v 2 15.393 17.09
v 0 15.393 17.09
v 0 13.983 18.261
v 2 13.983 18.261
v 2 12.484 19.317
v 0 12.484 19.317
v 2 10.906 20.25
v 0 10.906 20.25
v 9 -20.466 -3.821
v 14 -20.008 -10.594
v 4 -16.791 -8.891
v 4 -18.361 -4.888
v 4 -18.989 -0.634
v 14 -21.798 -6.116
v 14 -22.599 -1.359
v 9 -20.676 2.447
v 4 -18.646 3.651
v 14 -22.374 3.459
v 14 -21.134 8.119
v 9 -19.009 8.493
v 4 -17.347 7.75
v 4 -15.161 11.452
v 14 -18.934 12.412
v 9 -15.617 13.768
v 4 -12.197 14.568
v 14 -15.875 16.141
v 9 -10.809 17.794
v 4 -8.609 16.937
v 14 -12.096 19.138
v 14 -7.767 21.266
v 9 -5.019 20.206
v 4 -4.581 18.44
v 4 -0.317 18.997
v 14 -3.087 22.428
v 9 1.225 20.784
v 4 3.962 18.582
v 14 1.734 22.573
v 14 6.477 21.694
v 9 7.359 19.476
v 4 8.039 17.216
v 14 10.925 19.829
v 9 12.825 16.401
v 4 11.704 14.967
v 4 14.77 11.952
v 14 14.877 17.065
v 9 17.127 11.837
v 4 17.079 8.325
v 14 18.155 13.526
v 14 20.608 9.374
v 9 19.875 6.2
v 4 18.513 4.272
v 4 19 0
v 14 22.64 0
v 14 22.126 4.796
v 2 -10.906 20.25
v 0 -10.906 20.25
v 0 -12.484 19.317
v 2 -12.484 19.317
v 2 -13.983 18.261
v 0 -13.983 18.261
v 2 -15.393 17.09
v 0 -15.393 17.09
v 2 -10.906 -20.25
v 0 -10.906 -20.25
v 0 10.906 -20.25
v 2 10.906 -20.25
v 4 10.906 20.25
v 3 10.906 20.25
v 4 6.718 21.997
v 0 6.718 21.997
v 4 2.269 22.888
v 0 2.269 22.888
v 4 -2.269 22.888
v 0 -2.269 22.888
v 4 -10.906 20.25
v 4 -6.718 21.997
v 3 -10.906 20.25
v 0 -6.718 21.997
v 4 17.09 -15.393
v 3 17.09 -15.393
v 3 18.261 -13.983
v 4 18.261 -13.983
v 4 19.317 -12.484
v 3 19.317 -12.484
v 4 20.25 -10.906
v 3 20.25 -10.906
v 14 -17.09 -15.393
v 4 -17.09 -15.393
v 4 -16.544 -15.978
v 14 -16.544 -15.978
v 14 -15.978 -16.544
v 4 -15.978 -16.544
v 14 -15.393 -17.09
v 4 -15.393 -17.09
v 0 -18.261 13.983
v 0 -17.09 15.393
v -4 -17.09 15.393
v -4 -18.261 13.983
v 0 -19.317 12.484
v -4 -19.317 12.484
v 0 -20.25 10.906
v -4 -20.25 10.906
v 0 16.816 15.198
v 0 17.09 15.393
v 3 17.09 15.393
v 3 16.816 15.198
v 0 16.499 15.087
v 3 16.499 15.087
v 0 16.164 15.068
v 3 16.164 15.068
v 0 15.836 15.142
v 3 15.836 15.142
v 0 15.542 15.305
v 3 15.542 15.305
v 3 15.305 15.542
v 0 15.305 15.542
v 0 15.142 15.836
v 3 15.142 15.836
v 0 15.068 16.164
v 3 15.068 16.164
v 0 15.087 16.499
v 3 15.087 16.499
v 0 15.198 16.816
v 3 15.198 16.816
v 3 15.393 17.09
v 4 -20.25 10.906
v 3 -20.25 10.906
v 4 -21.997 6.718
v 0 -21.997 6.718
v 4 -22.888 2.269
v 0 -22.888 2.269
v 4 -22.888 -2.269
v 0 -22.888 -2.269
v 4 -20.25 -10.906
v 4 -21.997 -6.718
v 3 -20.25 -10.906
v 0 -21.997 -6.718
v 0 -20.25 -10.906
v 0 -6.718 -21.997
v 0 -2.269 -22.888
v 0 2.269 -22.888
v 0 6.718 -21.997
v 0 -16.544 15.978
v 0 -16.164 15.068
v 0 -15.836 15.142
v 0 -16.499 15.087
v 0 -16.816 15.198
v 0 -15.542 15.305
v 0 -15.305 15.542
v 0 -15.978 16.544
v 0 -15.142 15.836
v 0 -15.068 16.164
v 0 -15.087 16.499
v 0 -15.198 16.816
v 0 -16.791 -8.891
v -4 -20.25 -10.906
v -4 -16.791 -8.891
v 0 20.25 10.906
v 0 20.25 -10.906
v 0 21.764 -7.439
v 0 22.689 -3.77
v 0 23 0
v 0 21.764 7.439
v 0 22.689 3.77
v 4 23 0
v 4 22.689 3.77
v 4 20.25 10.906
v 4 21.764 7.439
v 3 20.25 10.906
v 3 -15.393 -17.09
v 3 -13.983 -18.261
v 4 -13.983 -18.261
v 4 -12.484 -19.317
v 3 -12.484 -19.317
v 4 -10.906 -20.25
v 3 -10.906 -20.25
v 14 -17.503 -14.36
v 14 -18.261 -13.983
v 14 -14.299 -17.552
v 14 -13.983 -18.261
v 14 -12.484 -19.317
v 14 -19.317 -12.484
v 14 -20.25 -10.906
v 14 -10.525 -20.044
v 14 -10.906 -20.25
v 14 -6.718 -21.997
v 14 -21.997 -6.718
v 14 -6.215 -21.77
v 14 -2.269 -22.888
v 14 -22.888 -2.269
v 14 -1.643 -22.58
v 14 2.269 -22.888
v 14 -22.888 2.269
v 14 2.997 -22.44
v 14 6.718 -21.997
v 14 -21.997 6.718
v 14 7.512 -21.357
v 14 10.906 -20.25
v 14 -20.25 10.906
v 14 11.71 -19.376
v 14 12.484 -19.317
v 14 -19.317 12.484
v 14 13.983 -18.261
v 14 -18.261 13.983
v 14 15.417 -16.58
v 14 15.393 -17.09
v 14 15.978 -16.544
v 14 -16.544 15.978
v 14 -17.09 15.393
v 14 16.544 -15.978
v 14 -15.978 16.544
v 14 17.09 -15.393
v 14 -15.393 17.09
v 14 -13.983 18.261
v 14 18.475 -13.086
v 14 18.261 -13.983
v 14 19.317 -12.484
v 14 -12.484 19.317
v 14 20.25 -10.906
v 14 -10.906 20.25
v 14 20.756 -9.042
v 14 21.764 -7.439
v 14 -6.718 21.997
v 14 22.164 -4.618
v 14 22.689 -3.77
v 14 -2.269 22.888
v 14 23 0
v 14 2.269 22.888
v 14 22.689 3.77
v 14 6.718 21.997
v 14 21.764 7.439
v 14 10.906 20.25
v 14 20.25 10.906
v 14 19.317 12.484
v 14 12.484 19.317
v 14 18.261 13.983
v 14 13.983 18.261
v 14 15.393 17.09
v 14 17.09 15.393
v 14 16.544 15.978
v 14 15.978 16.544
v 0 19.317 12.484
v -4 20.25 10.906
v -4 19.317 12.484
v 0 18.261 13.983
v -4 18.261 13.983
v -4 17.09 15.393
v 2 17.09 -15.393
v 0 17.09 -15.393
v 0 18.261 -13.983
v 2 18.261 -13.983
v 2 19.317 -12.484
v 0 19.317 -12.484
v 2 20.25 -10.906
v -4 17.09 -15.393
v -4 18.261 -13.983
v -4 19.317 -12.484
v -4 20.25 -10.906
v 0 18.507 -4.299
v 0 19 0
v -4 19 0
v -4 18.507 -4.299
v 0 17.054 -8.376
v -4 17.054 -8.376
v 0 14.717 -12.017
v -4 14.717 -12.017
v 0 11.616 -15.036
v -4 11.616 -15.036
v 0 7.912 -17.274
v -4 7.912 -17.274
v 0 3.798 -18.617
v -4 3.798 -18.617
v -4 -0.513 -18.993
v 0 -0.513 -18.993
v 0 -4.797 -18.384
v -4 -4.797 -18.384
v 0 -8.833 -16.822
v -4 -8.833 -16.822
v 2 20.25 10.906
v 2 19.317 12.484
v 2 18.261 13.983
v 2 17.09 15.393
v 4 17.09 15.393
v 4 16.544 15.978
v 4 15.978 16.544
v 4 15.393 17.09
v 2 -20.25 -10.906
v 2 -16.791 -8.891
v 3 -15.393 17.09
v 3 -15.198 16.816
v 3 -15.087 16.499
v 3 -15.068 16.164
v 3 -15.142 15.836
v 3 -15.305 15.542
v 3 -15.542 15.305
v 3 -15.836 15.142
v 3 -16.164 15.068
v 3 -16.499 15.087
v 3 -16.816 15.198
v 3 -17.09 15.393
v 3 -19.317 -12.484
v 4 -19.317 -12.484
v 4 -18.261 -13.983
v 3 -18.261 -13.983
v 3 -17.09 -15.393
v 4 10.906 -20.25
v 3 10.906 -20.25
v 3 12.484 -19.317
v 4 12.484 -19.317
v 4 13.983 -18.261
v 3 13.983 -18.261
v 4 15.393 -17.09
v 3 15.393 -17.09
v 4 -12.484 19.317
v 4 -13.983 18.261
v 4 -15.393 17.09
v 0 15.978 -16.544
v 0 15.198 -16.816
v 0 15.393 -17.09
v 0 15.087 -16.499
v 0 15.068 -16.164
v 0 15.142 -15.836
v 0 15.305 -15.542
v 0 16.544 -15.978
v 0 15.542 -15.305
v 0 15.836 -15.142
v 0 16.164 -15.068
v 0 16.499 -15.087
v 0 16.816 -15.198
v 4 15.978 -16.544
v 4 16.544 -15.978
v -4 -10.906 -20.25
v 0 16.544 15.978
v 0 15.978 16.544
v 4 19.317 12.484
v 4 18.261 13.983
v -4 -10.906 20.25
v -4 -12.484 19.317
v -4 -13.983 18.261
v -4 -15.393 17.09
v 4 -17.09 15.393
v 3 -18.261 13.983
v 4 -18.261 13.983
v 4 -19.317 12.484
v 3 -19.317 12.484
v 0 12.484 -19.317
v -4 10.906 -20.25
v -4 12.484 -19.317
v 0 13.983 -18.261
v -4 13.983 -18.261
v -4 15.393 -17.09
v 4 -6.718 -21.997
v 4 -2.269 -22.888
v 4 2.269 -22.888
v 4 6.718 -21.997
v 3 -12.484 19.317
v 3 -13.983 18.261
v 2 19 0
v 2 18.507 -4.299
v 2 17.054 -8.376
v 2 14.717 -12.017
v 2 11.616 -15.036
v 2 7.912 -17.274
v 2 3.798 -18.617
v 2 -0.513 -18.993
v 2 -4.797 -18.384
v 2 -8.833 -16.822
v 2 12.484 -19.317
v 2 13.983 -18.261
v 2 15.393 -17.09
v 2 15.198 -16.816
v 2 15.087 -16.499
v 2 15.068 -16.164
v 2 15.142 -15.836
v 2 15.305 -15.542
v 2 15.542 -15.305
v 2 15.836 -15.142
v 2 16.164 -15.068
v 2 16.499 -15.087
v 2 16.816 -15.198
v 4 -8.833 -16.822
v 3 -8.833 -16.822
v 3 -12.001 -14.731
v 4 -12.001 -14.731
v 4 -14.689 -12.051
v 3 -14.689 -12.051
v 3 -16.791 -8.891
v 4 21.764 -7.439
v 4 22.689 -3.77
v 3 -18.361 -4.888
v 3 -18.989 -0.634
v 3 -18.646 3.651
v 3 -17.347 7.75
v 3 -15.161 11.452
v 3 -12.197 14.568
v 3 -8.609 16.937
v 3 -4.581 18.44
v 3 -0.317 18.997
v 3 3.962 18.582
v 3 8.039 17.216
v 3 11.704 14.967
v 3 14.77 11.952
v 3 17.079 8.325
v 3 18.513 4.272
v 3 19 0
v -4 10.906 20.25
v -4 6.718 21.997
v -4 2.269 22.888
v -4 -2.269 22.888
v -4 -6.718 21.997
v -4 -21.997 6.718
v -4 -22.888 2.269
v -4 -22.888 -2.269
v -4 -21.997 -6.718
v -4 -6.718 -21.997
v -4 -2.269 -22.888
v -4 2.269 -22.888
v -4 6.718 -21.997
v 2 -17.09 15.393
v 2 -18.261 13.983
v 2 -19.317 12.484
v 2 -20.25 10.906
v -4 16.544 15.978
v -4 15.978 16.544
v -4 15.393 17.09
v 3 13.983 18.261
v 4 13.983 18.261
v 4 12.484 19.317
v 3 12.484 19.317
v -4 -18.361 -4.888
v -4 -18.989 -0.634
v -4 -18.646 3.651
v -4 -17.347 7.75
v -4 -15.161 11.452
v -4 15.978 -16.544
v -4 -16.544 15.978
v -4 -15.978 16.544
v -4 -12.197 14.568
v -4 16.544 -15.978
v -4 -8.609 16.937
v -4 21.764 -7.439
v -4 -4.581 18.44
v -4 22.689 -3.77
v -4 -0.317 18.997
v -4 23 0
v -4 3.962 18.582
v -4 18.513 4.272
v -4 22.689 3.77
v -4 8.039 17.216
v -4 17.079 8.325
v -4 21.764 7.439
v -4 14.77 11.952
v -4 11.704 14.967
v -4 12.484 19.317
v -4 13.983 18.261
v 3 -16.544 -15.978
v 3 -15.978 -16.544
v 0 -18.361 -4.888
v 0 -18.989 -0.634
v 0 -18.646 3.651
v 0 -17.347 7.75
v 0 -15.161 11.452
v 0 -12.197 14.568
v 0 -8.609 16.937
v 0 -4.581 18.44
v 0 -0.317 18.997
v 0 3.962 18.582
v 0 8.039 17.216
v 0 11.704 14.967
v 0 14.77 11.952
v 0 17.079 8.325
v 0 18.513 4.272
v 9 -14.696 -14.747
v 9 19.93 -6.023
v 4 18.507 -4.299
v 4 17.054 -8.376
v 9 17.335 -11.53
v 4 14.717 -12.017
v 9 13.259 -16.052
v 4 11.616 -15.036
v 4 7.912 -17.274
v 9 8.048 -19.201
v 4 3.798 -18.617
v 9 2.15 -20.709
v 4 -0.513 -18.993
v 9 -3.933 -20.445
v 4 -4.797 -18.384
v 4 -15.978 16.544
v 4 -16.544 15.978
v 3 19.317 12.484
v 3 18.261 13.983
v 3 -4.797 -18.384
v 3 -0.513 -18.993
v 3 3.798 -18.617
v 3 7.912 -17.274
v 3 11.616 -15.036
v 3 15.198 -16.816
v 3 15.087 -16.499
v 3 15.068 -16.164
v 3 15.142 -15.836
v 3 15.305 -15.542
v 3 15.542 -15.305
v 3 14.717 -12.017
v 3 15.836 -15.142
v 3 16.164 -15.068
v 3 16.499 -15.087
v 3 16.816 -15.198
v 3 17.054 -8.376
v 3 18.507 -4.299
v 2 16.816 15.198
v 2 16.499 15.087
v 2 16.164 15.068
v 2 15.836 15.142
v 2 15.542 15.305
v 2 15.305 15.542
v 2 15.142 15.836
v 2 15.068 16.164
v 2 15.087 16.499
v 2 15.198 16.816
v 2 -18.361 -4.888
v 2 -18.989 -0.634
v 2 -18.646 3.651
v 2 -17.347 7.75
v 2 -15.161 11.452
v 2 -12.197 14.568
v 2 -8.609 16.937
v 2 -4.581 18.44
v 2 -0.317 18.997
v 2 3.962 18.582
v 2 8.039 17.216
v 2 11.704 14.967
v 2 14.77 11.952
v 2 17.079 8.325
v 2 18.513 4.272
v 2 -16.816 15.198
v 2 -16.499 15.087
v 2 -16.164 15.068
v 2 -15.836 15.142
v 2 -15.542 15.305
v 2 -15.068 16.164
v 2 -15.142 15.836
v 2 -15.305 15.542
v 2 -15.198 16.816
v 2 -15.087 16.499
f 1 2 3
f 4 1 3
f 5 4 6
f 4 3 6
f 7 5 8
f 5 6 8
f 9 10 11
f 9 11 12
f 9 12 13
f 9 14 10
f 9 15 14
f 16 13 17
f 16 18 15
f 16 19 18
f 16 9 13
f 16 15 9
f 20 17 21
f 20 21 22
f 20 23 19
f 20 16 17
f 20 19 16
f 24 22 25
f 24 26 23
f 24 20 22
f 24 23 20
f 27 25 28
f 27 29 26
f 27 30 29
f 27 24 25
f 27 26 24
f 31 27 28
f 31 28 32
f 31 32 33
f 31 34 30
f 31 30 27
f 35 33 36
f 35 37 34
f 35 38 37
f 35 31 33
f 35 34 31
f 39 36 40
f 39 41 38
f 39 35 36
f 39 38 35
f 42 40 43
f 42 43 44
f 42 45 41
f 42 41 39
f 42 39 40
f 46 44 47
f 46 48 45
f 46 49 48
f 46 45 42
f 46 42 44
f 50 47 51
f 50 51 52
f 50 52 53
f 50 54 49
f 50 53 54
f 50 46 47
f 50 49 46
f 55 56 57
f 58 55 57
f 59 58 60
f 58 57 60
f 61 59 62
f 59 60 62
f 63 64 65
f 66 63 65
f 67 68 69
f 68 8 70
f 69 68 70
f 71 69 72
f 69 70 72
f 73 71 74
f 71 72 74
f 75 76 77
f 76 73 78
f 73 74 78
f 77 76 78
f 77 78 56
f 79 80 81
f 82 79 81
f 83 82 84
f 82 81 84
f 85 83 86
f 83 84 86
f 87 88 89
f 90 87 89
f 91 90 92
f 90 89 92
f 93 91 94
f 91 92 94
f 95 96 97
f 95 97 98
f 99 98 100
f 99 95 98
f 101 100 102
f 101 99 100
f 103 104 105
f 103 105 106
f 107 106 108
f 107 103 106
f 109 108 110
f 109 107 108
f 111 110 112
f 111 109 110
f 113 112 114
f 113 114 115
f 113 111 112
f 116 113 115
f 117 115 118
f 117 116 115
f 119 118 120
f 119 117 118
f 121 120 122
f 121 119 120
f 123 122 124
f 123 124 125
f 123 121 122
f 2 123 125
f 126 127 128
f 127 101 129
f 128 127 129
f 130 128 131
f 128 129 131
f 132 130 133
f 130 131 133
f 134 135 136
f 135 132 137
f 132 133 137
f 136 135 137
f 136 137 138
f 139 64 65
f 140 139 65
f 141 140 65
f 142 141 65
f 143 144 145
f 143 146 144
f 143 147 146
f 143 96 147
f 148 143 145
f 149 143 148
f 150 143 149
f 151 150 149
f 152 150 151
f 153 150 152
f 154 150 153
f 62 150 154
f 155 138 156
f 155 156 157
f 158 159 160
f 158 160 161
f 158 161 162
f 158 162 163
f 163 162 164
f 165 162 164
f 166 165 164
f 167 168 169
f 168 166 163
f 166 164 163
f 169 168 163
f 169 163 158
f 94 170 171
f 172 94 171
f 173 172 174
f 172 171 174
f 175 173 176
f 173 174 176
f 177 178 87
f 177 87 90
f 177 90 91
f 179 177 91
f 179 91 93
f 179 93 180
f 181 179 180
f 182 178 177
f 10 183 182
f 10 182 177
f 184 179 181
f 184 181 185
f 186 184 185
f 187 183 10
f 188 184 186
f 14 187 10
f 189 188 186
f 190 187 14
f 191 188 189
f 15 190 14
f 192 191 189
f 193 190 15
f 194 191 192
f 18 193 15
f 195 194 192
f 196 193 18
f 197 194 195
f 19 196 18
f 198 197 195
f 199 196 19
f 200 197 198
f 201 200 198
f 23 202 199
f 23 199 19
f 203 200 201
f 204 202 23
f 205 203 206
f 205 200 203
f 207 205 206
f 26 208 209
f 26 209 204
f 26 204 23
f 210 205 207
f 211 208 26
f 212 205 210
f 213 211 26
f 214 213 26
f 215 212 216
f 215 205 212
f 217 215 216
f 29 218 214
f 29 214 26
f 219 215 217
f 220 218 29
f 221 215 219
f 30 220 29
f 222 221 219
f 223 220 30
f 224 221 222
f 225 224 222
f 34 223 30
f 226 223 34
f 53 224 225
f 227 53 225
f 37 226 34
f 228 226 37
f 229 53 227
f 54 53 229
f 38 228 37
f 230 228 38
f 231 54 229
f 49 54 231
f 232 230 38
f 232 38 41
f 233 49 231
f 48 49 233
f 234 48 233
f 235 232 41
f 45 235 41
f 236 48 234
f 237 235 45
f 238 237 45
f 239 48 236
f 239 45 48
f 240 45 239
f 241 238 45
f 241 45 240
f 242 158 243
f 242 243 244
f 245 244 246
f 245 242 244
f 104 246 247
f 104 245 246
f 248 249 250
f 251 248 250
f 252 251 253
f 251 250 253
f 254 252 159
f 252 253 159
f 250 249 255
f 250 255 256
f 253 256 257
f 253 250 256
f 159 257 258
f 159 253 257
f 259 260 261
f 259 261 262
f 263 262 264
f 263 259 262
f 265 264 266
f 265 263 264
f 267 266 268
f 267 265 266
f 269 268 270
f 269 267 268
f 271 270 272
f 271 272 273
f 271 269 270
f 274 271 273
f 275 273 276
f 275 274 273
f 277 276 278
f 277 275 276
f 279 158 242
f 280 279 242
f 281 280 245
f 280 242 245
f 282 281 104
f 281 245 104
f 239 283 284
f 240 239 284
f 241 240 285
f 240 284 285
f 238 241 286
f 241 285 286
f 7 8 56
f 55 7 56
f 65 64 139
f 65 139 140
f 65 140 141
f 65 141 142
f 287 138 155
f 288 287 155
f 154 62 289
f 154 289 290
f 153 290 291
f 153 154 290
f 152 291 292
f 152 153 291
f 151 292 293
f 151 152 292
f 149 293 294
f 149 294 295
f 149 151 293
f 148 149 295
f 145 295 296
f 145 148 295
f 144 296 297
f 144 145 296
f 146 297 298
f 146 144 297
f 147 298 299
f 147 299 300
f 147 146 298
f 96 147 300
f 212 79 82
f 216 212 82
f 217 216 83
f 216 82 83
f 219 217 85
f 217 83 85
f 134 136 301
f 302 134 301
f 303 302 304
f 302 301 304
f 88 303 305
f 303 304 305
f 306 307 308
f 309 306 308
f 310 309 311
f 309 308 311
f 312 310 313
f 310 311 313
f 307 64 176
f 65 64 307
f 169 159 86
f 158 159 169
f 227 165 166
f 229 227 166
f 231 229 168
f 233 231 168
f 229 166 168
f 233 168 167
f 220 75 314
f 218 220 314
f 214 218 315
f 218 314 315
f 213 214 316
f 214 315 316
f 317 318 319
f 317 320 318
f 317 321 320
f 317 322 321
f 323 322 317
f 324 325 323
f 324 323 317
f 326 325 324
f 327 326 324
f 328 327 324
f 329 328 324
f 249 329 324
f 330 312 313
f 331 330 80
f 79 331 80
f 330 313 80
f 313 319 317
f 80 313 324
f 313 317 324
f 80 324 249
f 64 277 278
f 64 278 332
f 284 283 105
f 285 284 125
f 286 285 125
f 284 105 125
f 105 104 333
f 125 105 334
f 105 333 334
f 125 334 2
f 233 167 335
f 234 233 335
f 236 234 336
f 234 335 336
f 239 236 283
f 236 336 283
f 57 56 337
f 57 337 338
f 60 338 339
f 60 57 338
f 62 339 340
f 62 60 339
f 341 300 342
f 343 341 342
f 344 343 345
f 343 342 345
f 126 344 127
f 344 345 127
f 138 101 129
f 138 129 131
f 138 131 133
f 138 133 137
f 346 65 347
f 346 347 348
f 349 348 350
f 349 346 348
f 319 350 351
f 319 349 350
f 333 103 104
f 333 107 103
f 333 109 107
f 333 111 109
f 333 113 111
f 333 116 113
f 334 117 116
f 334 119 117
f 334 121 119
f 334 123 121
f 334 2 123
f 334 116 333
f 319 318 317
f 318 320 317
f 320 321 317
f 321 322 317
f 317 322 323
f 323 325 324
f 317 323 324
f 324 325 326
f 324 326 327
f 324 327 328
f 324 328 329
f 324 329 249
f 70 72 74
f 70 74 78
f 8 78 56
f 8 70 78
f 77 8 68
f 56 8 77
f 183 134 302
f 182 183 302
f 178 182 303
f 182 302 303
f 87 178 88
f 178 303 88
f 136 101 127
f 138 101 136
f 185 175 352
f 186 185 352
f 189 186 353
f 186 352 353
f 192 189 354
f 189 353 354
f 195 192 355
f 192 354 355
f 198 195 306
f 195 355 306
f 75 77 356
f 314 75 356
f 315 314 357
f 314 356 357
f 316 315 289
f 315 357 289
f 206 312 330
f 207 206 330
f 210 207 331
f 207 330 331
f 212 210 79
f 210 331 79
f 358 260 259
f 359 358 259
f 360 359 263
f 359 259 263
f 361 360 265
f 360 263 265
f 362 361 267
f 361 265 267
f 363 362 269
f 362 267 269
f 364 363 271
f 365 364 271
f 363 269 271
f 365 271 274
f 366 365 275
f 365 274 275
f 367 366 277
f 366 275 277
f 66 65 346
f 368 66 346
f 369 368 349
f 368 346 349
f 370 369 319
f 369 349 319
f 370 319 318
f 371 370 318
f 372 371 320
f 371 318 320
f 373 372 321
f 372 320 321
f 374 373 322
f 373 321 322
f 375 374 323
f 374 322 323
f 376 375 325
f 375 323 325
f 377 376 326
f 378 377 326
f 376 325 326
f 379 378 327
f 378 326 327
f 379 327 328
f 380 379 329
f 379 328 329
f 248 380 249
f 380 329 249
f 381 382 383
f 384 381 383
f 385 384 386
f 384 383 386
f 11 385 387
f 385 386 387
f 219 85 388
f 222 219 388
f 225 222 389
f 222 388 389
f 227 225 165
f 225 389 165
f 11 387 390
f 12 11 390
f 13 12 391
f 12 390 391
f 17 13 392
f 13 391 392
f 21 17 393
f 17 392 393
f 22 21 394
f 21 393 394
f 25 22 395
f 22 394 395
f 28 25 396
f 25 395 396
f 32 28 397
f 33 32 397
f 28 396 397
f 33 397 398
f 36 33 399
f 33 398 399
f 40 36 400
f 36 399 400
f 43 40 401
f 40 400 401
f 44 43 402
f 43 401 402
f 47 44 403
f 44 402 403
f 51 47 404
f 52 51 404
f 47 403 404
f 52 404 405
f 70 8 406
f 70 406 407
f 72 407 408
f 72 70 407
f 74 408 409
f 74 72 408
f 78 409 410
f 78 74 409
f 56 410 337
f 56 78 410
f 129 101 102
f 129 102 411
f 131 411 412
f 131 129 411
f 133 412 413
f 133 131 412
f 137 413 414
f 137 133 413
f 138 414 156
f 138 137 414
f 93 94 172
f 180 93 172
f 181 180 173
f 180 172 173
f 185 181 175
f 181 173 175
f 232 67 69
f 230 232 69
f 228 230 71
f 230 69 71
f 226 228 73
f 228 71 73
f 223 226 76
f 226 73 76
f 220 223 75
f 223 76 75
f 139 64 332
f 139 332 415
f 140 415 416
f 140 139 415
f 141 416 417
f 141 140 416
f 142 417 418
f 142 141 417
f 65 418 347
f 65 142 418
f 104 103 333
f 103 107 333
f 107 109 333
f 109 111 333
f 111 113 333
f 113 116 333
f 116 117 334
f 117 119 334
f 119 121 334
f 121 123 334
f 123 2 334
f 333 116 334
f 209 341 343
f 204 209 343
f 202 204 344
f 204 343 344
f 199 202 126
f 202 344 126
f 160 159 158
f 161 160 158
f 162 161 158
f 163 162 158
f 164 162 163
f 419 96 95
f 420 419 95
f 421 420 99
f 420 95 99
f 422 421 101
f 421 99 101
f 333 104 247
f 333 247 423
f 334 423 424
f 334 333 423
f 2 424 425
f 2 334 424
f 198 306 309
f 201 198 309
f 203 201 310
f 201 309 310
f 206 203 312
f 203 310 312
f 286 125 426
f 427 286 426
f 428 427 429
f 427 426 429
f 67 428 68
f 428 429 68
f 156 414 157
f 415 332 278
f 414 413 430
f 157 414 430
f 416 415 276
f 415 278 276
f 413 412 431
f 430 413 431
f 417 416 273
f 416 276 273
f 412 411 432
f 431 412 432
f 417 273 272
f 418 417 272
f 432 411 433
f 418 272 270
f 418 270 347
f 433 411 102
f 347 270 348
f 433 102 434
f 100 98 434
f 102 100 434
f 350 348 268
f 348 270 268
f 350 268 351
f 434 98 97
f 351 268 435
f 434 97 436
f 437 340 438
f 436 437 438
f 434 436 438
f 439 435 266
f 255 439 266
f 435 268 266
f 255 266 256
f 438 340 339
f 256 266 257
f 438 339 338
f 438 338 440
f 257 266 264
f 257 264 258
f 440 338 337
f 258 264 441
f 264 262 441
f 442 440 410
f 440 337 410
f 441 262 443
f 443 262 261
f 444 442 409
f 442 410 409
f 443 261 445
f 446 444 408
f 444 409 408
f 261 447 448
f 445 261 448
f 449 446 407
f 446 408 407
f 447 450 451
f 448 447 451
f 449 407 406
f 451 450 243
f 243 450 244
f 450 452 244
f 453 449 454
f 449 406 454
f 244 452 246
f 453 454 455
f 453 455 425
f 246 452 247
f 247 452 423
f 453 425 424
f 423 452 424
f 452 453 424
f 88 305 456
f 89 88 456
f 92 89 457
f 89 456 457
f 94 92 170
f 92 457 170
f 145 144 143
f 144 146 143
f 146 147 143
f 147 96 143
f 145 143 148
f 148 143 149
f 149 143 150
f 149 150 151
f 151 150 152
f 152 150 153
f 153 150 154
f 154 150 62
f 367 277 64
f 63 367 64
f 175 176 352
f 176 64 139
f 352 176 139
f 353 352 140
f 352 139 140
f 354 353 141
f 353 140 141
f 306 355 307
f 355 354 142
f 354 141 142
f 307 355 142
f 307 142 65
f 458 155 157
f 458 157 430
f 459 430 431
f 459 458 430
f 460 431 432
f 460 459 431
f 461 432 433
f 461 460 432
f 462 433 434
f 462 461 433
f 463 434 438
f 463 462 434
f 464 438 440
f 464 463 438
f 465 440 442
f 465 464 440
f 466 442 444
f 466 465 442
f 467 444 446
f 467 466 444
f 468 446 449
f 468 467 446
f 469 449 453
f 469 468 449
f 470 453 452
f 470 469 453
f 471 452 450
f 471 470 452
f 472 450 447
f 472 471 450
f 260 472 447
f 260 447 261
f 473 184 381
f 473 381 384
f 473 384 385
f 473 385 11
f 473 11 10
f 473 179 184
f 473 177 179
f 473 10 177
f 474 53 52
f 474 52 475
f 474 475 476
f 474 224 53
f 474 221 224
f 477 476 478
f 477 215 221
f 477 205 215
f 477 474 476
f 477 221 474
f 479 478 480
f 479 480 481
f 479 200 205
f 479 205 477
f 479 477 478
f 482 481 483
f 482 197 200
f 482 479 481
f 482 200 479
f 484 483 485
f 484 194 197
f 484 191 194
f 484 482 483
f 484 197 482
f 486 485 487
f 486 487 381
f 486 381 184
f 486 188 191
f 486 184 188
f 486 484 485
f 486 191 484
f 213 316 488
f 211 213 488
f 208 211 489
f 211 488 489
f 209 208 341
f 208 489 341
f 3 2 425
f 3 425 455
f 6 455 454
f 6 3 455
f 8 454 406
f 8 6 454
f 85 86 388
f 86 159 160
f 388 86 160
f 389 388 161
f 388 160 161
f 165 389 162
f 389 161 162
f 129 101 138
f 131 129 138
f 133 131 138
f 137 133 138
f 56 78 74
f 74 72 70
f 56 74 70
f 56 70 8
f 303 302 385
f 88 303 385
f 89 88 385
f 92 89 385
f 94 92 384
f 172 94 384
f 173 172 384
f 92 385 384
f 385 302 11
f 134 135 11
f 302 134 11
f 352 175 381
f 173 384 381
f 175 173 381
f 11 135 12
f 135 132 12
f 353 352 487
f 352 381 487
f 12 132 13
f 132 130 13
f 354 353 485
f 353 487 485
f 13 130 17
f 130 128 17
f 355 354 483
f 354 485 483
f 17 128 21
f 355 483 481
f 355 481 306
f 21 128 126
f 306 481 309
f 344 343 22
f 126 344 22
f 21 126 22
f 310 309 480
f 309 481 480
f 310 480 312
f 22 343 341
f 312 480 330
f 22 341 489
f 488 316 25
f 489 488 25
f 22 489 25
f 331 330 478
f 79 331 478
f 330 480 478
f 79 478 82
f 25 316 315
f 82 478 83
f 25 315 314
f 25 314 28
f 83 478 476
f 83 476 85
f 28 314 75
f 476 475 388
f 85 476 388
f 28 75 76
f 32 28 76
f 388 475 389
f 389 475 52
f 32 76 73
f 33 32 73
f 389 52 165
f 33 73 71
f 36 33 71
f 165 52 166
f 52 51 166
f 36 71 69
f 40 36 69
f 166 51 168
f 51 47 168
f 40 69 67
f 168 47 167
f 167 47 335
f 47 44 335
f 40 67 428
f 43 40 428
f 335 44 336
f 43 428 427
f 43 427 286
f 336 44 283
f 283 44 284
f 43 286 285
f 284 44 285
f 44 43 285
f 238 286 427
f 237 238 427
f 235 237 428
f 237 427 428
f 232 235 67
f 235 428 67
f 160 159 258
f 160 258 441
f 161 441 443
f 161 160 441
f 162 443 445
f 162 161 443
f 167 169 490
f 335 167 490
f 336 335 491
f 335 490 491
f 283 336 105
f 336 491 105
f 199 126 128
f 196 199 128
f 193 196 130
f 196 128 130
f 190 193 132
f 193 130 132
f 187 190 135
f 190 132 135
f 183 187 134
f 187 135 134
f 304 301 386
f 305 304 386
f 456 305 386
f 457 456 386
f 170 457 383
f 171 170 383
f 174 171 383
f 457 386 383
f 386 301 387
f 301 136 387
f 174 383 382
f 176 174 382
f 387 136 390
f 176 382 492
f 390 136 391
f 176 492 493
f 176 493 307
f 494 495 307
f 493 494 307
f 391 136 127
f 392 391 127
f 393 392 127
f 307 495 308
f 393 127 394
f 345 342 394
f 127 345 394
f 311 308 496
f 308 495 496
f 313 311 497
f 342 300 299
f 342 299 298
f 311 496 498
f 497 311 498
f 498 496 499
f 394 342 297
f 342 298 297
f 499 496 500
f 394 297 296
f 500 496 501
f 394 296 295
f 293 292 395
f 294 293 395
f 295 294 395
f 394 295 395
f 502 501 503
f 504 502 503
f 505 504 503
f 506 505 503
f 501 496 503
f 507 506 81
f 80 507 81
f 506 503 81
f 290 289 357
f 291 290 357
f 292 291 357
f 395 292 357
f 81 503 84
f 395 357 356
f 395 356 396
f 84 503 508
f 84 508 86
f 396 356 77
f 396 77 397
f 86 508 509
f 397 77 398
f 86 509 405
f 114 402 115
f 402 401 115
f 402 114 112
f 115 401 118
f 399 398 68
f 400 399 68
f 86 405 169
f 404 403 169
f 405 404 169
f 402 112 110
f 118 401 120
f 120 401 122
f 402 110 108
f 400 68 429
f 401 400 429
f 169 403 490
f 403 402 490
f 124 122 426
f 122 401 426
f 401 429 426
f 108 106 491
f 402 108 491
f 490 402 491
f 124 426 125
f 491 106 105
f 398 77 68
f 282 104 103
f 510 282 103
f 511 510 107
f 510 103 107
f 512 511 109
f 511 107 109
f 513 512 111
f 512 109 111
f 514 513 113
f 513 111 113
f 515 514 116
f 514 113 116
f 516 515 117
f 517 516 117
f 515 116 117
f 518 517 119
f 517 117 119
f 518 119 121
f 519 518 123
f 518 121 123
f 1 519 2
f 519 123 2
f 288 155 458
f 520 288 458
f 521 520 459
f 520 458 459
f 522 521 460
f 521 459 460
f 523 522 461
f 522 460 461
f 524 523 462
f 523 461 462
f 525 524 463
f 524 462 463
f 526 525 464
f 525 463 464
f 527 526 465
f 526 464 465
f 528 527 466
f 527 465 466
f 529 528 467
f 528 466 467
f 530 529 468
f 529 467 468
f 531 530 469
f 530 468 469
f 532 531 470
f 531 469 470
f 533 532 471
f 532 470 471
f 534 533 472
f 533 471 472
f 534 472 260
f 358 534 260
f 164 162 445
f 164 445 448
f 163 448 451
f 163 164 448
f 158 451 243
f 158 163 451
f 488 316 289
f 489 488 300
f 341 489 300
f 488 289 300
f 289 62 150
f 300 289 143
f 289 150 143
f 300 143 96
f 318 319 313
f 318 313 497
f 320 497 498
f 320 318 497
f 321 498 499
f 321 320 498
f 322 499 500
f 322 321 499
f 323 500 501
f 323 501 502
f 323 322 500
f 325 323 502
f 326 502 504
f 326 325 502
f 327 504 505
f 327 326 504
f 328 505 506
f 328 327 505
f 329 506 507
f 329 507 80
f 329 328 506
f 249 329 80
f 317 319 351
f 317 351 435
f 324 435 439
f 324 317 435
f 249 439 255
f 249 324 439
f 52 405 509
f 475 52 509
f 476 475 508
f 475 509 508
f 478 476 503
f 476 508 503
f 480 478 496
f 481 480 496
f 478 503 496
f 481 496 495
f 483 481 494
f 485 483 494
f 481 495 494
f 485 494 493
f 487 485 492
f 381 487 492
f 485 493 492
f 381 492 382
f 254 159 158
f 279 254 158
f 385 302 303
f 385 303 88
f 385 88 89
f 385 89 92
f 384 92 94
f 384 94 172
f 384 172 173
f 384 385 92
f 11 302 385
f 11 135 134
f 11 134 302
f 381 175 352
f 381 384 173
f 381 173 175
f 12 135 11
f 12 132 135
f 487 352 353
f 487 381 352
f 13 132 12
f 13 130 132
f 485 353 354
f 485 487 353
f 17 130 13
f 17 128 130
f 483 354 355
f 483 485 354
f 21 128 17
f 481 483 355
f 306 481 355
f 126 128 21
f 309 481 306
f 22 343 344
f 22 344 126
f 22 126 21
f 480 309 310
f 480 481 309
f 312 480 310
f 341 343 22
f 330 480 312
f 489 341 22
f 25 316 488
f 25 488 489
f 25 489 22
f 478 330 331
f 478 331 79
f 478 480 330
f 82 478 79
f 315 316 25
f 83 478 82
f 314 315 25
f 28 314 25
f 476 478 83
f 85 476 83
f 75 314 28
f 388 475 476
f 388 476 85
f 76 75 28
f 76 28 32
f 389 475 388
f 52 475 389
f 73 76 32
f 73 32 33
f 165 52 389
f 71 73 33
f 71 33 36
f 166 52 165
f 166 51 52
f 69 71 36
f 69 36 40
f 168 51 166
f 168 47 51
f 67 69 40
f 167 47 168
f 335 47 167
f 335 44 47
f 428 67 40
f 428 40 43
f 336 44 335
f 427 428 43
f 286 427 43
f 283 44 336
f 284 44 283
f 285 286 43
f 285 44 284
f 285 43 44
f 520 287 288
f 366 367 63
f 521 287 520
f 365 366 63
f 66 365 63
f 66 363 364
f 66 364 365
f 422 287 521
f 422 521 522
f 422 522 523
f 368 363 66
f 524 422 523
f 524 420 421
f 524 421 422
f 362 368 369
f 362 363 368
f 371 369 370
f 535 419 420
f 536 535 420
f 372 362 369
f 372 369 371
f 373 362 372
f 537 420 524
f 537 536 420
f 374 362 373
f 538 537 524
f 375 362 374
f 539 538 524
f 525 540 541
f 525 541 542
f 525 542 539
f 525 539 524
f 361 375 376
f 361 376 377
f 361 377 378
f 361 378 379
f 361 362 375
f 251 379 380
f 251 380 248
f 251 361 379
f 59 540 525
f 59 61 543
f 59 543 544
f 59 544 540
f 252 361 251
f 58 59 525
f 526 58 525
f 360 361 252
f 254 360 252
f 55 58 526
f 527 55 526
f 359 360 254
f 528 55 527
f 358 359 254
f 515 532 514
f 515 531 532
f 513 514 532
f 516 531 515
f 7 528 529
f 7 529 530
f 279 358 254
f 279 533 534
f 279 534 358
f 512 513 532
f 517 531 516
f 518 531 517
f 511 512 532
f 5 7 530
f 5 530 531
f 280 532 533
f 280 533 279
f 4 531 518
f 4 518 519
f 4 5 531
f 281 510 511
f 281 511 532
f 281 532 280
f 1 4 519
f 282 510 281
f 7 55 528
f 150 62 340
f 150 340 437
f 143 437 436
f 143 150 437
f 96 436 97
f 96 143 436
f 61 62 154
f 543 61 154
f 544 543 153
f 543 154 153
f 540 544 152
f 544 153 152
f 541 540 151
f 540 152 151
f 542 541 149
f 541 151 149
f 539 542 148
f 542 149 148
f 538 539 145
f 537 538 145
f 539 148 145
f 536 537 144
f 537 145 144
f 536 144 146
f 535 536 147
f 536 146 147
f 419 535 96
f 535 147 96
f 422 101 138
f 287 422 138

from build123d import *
from build123d import SkipClean  # not in build123d's __all__

# Parameters (mm, degrees)
F1_DEPTH = 4
F2_DEPTH = 3
F3_DEPTH = 2
F4_DEPTH = 4
F5_DEPTH = 10
F6_SIZE2 = 3.639692
F6_SIZE  = 9.99999


# Not quite as in the source:
# - a fillet or chamfer is up to 0.001 mm smaller than in the source, because OpenCascade refuses the exact size


with BuildPart() as f1:
    # F0 (on Right) → F1 (new body)
    with BuildSketch(Plane.YZ):
        with BuildLine():
            ThreePointArc((-10.9058470556, -20.25), (0, -23), (10.9058470556, -20.25))
            Line((10.9058470556, -20.25), (-10.9058470556, -20.25))
        make_face()
        with BuildLine():
            Line((-10.9058470556, -20.25), (10.9058470556, -20.25))
            ThreePointArc((10.9058470556, -20.25), (13.2440741804, -18.8041085698), (15.3930810865, -17.0895598148))
            ThreePointArc((15.3930810865, -17.0895598148), (15.4149278299, -15.4149278299), (17.0895598148, -15.3930810865))
            ThreePointArc((17.0895598148, -15.3930810865), (18.8041085698, -13.2440741804), (20.25, -10.9058470556))
            Line((20.25, -10.9058470556), (20.25, 10.9058470556))
            ThreePointArc((20.25, 10.9058470556), (18.8041085698, 13.2440741804), (17.0895598148, 15.3930810865))
            ThreePointArc((17.0895598148, 15.3930810865), (15.4149278299, 15.4149278299), (15.3930810865, 17.0895598148))
            ThreePointArc((15.3930810865, 17.0895598148), (13.2440741804, 18.8041085698), (10.9058470556, 20.25))
            Line((10.9058470556, 20.25), (-10.9058470556, 20.25))
            ThreePointArc((-10.9058470556, 20.25), (-13.2440741804, 18.8041085698), (-15.3930810865, 17.0895598148))
            ThreePointArc((-15.3930810865, 17.0895598148), (-15.4149278299, 15.4149278299), (-17.0895598148, 15.3930810865))
            ThreePointArc((-17.0895598148, 15.3930810865), (-18.8041085698, 13.2440741804), (-20.25, 10.9058470556))
            Line((-20.25, 10.9058470556), (-20.25, -10.9058470556))
            Line((-20.25, -10.9058470556), (-16.7913530234, -8.8910327658))
            ThreePointArc((-16.7913530234, -8.8910327658), (-4.5806272799, 18.4395730353), (19, 0))
            ThreePointArc((19, 0), (9.8278072985, -16.2608180515), (-8.833074074, -16.8219143501))
            Line((-8.833074074, -16.8219143501), (-10.9058470556, -20.25))
        make_face()
        with BuildLine():
            ThreePointArc((-15.3930810865, -17.0895598148), (-13.2440741804, -18.8041085698), (-10.9058470556, -20.25))
            Line((-10.9058470556, -20.25), (-8.833074074, -16.8219143501))
            ThreePointArc((-8.833074074, -16.8219143501), (-13.4118431505, -13.4581745904), (-16.7913530234, -8.8910327658))
            Line((-16.7913530234, -8.8910327658), (-20.25, -10.9058470556))
            ThreePointArc((-20.25, -10.9058470556), (-18.8041085698, -13.2440741804), (-17.0895598148, -15.3930810865))
            ThreePointArc((-17.0895598148, -15.3930810865), (-15.4149278299, -15.4149278299), (-15.3930810865, -17.0895598148))
        make_face()
        with BuildLine():
            ThreePointArc((17.0895598148, -15.3930810865), (15.4149278299, -15.4149278299), (15.3930810865, -17.0895598148))
            ThreePointArc((15.3930810865, -17.0895598148), (16.2634559673, -16.2634559673), (17.0895598148, -15.3930810865))
        make_face()
        with BuildLine():
            ThreePointArc((-17.0895598148, -15.3930810865), (-16.2634559673, -16.2634559673), (-15.3930810865, -17.0895598148))
            ThreePointArc((-15.3930810865, -17.0895598148), (-15.4149278299, -15.4149278299), (-17.0895598148, -15.3930810865))
        make_face()
        with BuildLine():
            Line((20.25, 10.9058470556), (20.25, -10.9058470556))
            ThreePointArc((20.25, -10.9058470556), (22.3019057482, -5.6236109396), (23, 0))
            ThreePointArc((23, 0), (22.3019057482, 5.6236109396), (20.25, 10.9058470556))
        make_face()
        with BuildLine():
            ThreePointArc((-20.25, 10.9058470556), (-23, 0), (-20.25, -10.9058470556))
            Line((-20.25, -10.9058470556), (-20.25, 10.9058470556))
        make_face()
        with BuildLine():
            ThreePointArc((15.3930810865, 17.0895598148), (15.4149278299, 15.4149278299), (17.0895598148, 15.3930810865))
            ThreePointArc((17.0895598148, 15.3930810865), (16.2634559673, 16.2634559673), (15.3930810865, 17.0895598148))
        make_face()
        with BuildLine():
            ThreePointArc((-15.3930810865, 17.0895598148), (-16.2634559673, 16.2634559673), (-17.0895598148, 15.3930810865))
            ThreePointArc((-17.0895598148, 15.3930810865), (-15.4149278299, 15.4149278299), (-15.3930810865, 17.0895598148))
        make_face()
        with BuildLine():
            Line((-10.9058470556, 20.25), (10.9058470556, 20.25))
            ThreePointArc((10.9058470556, 20.25), (0, 23), (-10.9058470556, 20.25))
        make_face()
    extrude(amount=F1_DEPTH)

    # F0 (on Right) → F2 (cut)
    with BuildSketch(Plane.YZ):
        with BuildLine():
            Line((-10.9058470556, -20.25), (10.9058470556, -20.25))
            ThreePointArc((10.9058470556, -20.25), (13.2440741804, -18.8041085698), (15.3930810865, -17.0895598148))
            ThreePointArc((15.3930810865, -17.0895598148), (15.4149278299, -15.4149278299), (17.0895598148, -15.3930810865))
            ThreePointArc((17.0895598148, -15.3930810865), (18.8041085698, -13.2440741804), (20.25, -10.9058470556))
            Line((20.25, -10.9058470556), (20.25, 10.9058470556))
            ThreePointArc((20.25, 10.9058470556), (18.8041085698, 13.2440741804), (17.0895598148, 15.3930810865))
            ThreePointArc((17.0895598148, 15.3930810865), (15.4149278299, 15.4149278299), (15.3930810865, 17.0895598148))
            ThreePointArc((15.3930810865, 17.0895598148), (13.2440741804, 18.8041085698), (10.9058470556, 20.25))
            Line((10.9058470556, 20.25), (-10.9058470556, 20.25))
            ThreePointArc((-10.9058470556, 20.25), (-13.2440741804, 18.8041085698), (-15.3930810865, 17.0895598148))
            ThreePointArc((-15.3930810865, 17.0895598148), (-15.4149278299, 15.4149278299), (-17.0895598148, 15.3930810865))
            ThreePointArc((-17.0895598148, 15.3930810865), (-18.8041085698, 13.2440741804), (-20.25, 10.9058470556))
            Line((-20.25, 10.9058470556), (-20.25, -10.9058470556))
            Line((-20.25, -10.9058470556), (-16.7913530234, -8.8910327658))
            ThreePointArc((-16.7913530234, -8.8910327658), (-4.5806272799, 18.4395730353), (19, 0))
            ThreePointArc((19, 0), (9.8278072985, -16.2608180515), (-8.833074074, -16.8219143501))
            Line((-8.833074074, -16.8219143501), (-10.9058470556, -20.25))
        make_face()
        with BuildLine():
            ThreePointArc((-15.3930810865, -17.0895598148), (-13.2440741804, -18.8041085698), (-10.9058470556, -20.25))
            Line((-10.9058470556, -20.25), (-8.833074074, -16.8219143501))
            ThreePointArc((-8.833074074, -16.8219143501), (-13.4118431505, -13.4581745904), (-16.7913530234, -8.8910327658))
            Line((-16.7913530234, -8.8910327658), (-20.25, -10.9058470556))
            ThreePointArc((-20.25, -10.9058470556), (-18.8041085698, -13.2440741804), (-17.0895598148, -15.3930810865))
            ThreePointArc((-17.0895598148, -15.3930810865), (-15.4149278299, -15.4149278299), (-15.3930810865, -17.0895598148))
        make_face()
        with BuildLine():
            ThreePointArc((-17.0895598148, -15.3930810865), (-16.2634559673, -16.2634559673), (-15.3930810865, -17.0895598148))
            ThreePointArc((-15.3930810865, -17.0895598148), (-15.4149278299, -15.4149278299), (-17.0895598148, -15.3930810865))
        make_face()
    extrude(amount=F2_DEPTH, mode=Mode.SUBTRACT)


with BuildPart() as f3:
    # F0 (on Right) → F3 (new body)
    with BuildSketch(Plane.YZ):
        with BuildLine():
            Line((-10.9058470556, -20.25), (10.9058470556, -20.25))
            ThreePointArc((10.9058470556, -20.25), (13.2440741804, -18.8041085698), (15.3930810865, -17.0895598148))
            ThreePointArc((15.3930810865, -17.0895598148), (15.4149278299, -15.4149278299), (17.0895598148, -15.3930810865))
            ThreePointArc((17.0895598148, -15.3930810865), (18.8041085698, -13.2440741804), (20.25, -10.9058470556))
            Line((20.25, -10.9058470556), (20.25, 10.9058470556))
            ThreePointArc((20.25, 10.9058470556), (18.8041085698, 13.2440741804), (17.0895598148, 15.3930810865))
            ThreePointArc((17.0895598148, 15.3930810865), (15.4149278299, 15.4149278299), (15.3930810865, 17.0895598148))
            ThreePointArc((15.3930810865, 17.0895598148), (13.2440741804, 18.8041085698), (10.9058470556, 20.25))
            Line((10.9058470556, 20.25), (-10.9058470556, 20.25))
            ThreePointArc((-10.9058470556, 20.25), (-13.2440741804, 18.8041085698), (-15.3930810865, 17.0895598148))
            ThreePointArc((-15.3930810865, 17.0895598148), (-15.4149278299, 15.4149278299), (-17.0895598148, 15.3930810865))
            ThreePointArc((-17.0895598148, 15.3930810865), (-18.8041085698, 13.2440741804), (-20.25, 10.9058470556))
            Line((-20.25, 10.9058470556), (-20.25, -10.9058470556))
            Line((-20.25, -10.9058470556), (-16.7913530234, -8.8910327658))
            ThreePointArc((-16.7913530234, -8.8910327658), (-4.5806272799, 18.4395730353), (19, 0))
            ThreePointArc((19, 0), (9.8278072985, -16.2608180515), (-8.833074074, -16.8219143501))
            Line((-8.833074074, -16.8219143501), (-10.9058470556, -20.25))
        make_face()
    extrude(amount=F3_DEPTH)

    # F0 (on Right) → F4 (join)
    with BuildSketch(Plane.YZ):
        with BuildLine():
            ThreePointArc((-10.9058470556, -20.25), (0, -23), (10.9058470556, -20.25))
            Line((10.9058470556, -20.25), (-10.9058470556, -20.25))
        make_face()
        with BuildLine():
            Line((-10.9058470556, 20.25), (10.9058470556, 20.25))
            ThreePointArc((10.9058470556, 20.25), (0, 23), (-10.9058470556, 20.25))
        make_face()
        with BuildLine():
            Line((20.25, 10.9058470556), (20.25, -10.9058470556))
            ThreePointArc((20.25, -10.9058470556), (22.3019057482, -5.6236109396), (23, 0))
            ThreePointArc((23, 0), (22.3019057482, 5.6236109396), (20.25, 10.9058470556))
        make_face()
        with BuildLine():
            ThreePointArc((-20.25, 10.9058470556), (-23, 0), (-20.25, -10.9058470556))
            Line((-20.25, -10.9058470556), (-20.25, 10.9058470556))
        make_face()
        with BuildLine():
            ThreePointArc((15.3930810865, 17.0895598148), (15.4149278299, 15.4149278299), (17.0895598148, 15.3930810865))
            ThreePointArc((17.0895598148, 15.3930810865), (16.2634559673, 16.2634559673), (15.3930810865, 17.0895598148))
        make_face()
        with BuildLine():
            ThreePointArc((-15.3930810865, 17.0895598148), (-16.2634559673, 16.2634559673), (-17.0895598148, 15.3930810865))
            ThreePointArc((-17.0895598148, 15.3930810865), (-15.4149278299, 15.4149278299), (-15.3930810865, 17.0895598148))
        make_face()
        with BuildLine():
            ThreePointArc((17.0895598148, -15.3930810865), (15.4149278299, -15.4149278299), (15.3930810865, -17.0895598148))
            ThreePointArc((15.3930810865, -17.0895598148), (16.2634559673, -16.2634559673), (17.0895598148, -15.3930810865))
        make_face()
        with BuildLine():
            Line((-10.9058470556, -20.25), (10.9058470556, -20.25))
            ThreePointArc((10.9058470556, -20.25), (13.2440741804, -18.8041085698), (15.3930810865, -17.0895598148))
            ThreePointArc((15.3930810865, -17.0895598148), (15.4149278299, -15.4149278299), (17.0895598148, -15.3930810865))
            ThreePointArc((17.0895598148, -15.3930810865), (18.8041085698, -13.2440741804), (20.25, -10.9058470556))
            Line((20.25, -10.9058470556), (20.25, 10.9058470556))
            ThreePointArc((20.25, 10.9058470556), (18.8041085698, 13.2440741804), (17.0895598148, 15.3930810865))
            ThreePointArc((17.0895598148, 15.3930810865), (15.4149278299, 15.4149278299), (15.3930810865, 17.0895598148))
            ThreePointArc((15.3930810865, 17.0895598148), (13.2440741804, 18.8041085698), (10.9058470556, 20.25))
            Line((10.9058470556, 20.25), (-10.9058470556, 20.25))
            ThreePointArc((-10.9058470556, 20.25), (-13.2440741804, 18.8041085698), (-15.3930810865, 17.0895598148))
            ThreePointArc((-15.3930810865, 17.0895598148), (-15.4149278299, 15.4149278299), (-17.0895598148, 15.3930810865))
            ThreePointArc((-17.0895598148, 15.3930810865), (-18.8041085698, 13.2440741804), (-20.25, 10.9058470556))
            Line((-20.25, 10.9058470556), (-20.25, -10.9058470556))
            Line((-20.25, -10.9058470556), (-16.7913530234, -8.8910327658))
            ThreePointArc((-16.7913530234, -8.8910327658), (-4.5806272799, 18.4395730353), (19, 0))
            ThreePointArc((19, 0), (9.8278072985, -16.2608180515), (-8.833074074, -16.8219143501))
            Line((-8.833074074, -16.8219143501), (-10.9058470556, -20.25))
        make_face()
    with SkipClean():  # cleaning this boolean's faces spoils the solid; the shape is the same uncleaned
        extrude(amount=-F4_DEPTH)


with BuildPart() as f5:
    # F5 (new): a face of the model
    f5_faces = [f1.part.faces().sort_by_distance(p)[0] for p in [
        (4, -10.5973831193, -19.6772435072),
    ]]
    extrude(f5_faces, amount=F5_DEPTH)

    # F6 (size 10 and 3.6397023427 in the source; OpenCascade refuses exactly that, so slightly less here)
    f6_edges = [f5.edges().sort_by_distance(p)[0] for p in [
        (14, 8.833074, 16.821914),
    ]]
    f6_side = f5.faces().sort_by_distance((9, 8.833074, 16.821914))[0]
    chamfer(f6_edges, length=F6_SIZE, length2=F6_SIZE2, reference=f6_side)


solid = Compound([f1.part, f3.part, f5.part])
